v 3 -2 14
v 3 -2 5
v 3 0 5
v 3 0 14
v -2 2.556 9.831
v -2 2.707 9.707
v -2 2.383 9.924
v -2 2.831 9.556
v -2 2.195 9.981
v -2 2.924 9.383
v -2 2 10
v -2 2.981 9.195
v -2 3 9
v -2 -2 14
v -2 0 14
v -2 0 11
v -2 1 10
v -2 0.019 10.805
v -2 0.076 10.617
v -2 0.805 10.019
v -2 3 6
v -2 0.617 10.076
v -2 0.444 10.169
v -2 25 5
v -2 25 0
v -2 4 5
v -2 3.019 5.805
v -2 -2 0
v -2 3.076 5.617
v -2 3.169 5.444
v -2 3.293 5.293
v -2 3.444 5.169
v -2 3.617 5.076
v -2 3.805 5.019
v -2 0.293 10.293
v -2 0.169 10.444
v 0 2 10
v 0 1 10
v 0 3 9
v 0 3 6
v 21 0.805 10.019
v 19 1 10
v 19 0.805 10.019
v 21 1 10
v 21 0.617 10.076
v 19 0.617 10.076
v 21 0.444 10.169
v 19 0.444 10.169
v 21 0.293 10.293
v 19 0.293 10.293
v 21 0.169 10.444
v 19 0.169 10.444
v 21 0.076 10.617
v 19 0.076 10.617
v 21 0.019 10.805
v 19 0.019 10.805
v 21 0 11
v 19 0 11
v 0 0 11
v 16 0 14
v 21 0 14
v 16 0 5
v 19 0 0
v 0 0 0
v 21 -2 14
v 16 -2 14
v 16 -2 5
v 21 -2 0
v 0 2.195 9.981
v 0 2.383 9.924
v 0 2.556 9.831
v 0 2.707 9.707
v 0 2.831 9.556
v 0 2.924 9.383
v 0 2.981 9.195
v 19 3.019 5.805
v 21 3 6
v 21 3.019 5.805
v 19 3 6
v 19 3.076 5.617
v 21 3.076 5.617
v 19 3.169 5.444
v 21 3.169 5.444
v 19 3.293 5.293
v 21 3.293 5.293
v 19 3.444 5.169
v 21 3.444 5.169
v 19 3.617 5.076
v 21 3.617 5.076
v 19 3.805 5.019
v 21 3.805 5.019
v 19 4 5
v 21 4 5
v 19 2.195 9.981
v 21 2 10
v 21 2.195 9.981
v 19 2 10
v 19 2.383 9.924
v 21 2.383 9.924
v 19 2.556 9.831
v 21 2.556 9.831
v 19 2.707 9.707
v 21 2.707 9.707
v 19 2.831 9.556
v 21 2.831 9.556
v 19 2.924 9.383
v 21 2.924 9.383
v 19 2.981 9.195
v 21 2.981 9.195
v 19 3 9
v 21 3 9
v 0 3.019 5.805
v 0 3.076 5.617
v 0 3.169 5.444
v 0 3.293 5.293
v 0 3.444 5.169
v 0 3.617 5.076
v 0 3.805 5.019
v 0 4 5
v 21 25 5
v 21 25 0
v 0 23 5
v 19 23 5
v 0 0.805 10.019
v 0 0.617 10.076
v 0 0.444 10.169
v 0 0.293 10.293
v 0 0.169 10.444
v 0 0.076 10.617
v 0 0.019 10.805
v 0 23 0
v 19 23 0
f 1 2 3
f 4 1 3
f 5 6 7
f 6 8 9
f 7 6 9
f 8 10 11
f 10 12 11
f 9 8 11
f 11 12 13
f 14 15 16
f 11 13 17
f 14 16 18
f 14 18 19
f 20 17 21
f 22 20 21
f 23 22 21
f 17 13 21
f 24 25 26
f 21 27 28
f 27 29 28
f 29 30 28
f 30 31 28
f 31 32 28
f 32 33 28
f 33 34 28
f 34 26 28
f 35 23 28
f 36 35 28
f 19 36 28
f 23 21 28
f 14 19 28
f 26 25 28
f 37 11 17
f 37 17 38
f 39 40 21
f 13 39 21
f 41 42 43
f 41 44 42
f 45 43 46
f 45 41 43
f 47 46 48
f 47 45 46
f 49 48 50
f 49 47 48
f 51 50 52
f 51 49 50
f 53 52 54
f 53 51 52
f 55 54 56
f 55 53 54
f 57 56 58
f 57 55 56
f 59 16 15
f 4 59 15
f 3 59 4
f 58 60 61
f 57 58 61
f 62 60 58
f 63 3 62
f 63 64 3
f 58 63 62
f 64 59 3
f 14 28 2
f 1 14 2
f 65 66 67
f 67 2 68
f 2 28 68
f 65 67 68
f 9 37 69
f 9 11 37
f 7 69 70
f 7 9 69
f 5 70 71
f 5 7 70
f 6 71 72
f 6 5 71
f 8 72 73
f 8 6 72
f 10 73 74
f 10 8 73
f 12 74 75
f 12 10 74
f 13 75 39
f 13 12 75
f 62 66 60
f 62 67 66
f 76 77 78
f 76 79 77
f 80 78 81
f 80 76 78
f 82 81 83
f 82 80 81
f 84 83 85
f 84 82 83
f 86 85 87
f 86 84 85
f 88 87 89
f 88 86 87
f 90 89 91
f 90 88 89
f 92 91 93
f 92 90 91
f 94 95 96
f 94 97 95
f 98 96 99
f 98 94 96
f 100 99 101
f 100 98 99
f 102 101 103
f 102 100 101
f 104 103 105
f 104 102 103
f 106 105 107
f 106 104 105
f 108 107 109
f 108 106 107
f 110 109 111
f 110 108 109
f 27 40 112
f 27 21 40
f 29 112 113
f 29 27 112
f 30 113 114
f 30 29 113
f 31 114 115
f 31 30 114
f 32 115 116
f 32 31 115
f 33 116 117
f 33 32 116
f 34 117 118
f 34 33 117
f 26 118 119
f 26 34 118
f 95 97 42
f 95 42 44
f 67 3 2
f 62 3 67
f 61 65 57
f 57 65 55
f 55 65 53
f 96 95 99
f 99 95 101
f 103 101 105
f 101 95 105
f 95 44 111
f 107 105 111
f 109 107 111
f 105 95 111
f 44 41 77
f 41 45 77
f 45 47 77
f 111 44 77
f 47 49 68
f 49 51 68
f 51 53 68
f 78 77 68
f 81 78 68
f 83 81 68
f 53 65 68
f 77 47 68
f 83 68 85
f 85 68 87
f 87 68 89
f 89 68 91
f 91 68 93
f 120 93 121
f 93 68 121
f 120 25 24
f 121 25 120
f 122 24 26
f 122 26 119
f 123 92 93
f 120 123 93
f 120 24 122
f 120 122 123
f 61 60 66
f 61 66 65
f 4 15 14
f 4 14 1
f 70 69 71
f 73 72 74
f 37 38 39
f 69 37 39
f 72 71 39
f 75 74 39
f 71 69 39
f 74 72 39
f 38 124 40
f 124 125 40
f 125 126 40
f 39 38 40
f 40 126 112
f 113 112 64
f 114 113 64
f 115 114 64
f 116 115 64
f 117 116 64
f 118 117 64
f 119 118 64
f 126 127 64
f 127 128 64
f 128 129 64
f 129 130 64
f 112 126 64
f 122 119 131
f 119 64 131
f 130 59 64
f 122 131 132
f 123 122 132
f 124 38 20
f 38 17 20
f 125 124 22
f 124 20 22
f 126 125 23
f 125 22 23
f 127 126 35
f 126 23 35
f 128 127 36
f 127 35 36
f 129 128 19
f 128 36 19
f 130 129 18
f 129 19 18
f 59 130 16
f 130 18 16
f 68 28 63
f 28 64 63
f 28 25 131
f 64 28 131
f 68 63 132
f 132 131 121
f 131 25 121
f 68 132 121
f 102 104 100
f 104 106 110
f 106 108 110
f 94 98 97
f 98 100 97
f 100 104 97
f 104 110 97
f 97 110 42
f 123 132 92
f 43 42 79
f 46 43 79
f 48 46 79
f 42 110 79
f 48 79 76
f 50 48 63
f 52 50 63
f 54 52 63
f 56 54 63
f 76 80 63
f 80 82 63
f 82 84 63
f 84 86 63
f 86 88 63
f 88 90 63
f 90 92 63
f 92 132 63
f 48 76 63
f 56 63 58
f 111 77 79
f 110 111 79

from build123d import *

# Parameters (mm, degrees)
F0_W     = 23
F0_H     = 27
F0_W_2   = 19
F0_H_2   = 23
F1_DEPTH = 5
F3_DEPTH = 5
F5_DEPTH = 5
F7_DEPTH = 4
F8_W     = 5
F8_H     = 2
F9_DEPTH = 4
F10_R    = 1


with BuildPart() as f1:
    # F0 (on Top) → F1 (new body)
    with BuildSketch(Plane.XY):
        with Locations((9.5, 11.5)):
            Rectangle(F0_W, F0_H)
        with Locations((9.5, 11.5)):
            Rectangle(F0_W_2, F0_H_2, mode=Mode.SUBTRACT)
    extrude(amount=F1_DEPTH)

    # F2 (on face) → F3 (join)
    with BuildSketch(Plane.XY.offset(5)):
        Polygon((3, 0), (0, 0), (0, 3), (-2, 3), (-2, -2), (3, -2), align=None)
    extrude(amount=F3_DEPTH)

    # F4 (on face) → F5 (join)
    with BuildSketch(Plane.XY.offset(5)):
        Polygon((19, 3), (19, 0), (16, 0), (16, -2), (21, -2), (21, 3), align=None)
    extrude(amount=F5_DEPTH)

    # F6 (on face) → F7 (join)
    with BuildSketch(Plane.XY.offset(10)):
        Polygon((3, 0), (0, 0), (-2, 0), (-2, -2), (3, -2), align=None)
    extrude(amount=F7_DEPTH)

    # F8 (on face) → F9 (join)
    with BuildSketch(Plane.XY.offset(10)):
        with Locations((18.5, -1)):
            Rectangle(F8_W, F8_H)
    extrude(amount=F9_DEPTH)

    # F10
    f10_edges = [f1.edges().sort_by_distance(p)[0] for p in [
        (20, 3, 5),
        (20, 0, 10),
        (20, 3, 10),
        (-1, 0, 10),
        (-1, 3, 10),
        (-1, 3, 5),
    ]]
    fillet(f10_edges, radius=F10_R)


solid = f1.part
